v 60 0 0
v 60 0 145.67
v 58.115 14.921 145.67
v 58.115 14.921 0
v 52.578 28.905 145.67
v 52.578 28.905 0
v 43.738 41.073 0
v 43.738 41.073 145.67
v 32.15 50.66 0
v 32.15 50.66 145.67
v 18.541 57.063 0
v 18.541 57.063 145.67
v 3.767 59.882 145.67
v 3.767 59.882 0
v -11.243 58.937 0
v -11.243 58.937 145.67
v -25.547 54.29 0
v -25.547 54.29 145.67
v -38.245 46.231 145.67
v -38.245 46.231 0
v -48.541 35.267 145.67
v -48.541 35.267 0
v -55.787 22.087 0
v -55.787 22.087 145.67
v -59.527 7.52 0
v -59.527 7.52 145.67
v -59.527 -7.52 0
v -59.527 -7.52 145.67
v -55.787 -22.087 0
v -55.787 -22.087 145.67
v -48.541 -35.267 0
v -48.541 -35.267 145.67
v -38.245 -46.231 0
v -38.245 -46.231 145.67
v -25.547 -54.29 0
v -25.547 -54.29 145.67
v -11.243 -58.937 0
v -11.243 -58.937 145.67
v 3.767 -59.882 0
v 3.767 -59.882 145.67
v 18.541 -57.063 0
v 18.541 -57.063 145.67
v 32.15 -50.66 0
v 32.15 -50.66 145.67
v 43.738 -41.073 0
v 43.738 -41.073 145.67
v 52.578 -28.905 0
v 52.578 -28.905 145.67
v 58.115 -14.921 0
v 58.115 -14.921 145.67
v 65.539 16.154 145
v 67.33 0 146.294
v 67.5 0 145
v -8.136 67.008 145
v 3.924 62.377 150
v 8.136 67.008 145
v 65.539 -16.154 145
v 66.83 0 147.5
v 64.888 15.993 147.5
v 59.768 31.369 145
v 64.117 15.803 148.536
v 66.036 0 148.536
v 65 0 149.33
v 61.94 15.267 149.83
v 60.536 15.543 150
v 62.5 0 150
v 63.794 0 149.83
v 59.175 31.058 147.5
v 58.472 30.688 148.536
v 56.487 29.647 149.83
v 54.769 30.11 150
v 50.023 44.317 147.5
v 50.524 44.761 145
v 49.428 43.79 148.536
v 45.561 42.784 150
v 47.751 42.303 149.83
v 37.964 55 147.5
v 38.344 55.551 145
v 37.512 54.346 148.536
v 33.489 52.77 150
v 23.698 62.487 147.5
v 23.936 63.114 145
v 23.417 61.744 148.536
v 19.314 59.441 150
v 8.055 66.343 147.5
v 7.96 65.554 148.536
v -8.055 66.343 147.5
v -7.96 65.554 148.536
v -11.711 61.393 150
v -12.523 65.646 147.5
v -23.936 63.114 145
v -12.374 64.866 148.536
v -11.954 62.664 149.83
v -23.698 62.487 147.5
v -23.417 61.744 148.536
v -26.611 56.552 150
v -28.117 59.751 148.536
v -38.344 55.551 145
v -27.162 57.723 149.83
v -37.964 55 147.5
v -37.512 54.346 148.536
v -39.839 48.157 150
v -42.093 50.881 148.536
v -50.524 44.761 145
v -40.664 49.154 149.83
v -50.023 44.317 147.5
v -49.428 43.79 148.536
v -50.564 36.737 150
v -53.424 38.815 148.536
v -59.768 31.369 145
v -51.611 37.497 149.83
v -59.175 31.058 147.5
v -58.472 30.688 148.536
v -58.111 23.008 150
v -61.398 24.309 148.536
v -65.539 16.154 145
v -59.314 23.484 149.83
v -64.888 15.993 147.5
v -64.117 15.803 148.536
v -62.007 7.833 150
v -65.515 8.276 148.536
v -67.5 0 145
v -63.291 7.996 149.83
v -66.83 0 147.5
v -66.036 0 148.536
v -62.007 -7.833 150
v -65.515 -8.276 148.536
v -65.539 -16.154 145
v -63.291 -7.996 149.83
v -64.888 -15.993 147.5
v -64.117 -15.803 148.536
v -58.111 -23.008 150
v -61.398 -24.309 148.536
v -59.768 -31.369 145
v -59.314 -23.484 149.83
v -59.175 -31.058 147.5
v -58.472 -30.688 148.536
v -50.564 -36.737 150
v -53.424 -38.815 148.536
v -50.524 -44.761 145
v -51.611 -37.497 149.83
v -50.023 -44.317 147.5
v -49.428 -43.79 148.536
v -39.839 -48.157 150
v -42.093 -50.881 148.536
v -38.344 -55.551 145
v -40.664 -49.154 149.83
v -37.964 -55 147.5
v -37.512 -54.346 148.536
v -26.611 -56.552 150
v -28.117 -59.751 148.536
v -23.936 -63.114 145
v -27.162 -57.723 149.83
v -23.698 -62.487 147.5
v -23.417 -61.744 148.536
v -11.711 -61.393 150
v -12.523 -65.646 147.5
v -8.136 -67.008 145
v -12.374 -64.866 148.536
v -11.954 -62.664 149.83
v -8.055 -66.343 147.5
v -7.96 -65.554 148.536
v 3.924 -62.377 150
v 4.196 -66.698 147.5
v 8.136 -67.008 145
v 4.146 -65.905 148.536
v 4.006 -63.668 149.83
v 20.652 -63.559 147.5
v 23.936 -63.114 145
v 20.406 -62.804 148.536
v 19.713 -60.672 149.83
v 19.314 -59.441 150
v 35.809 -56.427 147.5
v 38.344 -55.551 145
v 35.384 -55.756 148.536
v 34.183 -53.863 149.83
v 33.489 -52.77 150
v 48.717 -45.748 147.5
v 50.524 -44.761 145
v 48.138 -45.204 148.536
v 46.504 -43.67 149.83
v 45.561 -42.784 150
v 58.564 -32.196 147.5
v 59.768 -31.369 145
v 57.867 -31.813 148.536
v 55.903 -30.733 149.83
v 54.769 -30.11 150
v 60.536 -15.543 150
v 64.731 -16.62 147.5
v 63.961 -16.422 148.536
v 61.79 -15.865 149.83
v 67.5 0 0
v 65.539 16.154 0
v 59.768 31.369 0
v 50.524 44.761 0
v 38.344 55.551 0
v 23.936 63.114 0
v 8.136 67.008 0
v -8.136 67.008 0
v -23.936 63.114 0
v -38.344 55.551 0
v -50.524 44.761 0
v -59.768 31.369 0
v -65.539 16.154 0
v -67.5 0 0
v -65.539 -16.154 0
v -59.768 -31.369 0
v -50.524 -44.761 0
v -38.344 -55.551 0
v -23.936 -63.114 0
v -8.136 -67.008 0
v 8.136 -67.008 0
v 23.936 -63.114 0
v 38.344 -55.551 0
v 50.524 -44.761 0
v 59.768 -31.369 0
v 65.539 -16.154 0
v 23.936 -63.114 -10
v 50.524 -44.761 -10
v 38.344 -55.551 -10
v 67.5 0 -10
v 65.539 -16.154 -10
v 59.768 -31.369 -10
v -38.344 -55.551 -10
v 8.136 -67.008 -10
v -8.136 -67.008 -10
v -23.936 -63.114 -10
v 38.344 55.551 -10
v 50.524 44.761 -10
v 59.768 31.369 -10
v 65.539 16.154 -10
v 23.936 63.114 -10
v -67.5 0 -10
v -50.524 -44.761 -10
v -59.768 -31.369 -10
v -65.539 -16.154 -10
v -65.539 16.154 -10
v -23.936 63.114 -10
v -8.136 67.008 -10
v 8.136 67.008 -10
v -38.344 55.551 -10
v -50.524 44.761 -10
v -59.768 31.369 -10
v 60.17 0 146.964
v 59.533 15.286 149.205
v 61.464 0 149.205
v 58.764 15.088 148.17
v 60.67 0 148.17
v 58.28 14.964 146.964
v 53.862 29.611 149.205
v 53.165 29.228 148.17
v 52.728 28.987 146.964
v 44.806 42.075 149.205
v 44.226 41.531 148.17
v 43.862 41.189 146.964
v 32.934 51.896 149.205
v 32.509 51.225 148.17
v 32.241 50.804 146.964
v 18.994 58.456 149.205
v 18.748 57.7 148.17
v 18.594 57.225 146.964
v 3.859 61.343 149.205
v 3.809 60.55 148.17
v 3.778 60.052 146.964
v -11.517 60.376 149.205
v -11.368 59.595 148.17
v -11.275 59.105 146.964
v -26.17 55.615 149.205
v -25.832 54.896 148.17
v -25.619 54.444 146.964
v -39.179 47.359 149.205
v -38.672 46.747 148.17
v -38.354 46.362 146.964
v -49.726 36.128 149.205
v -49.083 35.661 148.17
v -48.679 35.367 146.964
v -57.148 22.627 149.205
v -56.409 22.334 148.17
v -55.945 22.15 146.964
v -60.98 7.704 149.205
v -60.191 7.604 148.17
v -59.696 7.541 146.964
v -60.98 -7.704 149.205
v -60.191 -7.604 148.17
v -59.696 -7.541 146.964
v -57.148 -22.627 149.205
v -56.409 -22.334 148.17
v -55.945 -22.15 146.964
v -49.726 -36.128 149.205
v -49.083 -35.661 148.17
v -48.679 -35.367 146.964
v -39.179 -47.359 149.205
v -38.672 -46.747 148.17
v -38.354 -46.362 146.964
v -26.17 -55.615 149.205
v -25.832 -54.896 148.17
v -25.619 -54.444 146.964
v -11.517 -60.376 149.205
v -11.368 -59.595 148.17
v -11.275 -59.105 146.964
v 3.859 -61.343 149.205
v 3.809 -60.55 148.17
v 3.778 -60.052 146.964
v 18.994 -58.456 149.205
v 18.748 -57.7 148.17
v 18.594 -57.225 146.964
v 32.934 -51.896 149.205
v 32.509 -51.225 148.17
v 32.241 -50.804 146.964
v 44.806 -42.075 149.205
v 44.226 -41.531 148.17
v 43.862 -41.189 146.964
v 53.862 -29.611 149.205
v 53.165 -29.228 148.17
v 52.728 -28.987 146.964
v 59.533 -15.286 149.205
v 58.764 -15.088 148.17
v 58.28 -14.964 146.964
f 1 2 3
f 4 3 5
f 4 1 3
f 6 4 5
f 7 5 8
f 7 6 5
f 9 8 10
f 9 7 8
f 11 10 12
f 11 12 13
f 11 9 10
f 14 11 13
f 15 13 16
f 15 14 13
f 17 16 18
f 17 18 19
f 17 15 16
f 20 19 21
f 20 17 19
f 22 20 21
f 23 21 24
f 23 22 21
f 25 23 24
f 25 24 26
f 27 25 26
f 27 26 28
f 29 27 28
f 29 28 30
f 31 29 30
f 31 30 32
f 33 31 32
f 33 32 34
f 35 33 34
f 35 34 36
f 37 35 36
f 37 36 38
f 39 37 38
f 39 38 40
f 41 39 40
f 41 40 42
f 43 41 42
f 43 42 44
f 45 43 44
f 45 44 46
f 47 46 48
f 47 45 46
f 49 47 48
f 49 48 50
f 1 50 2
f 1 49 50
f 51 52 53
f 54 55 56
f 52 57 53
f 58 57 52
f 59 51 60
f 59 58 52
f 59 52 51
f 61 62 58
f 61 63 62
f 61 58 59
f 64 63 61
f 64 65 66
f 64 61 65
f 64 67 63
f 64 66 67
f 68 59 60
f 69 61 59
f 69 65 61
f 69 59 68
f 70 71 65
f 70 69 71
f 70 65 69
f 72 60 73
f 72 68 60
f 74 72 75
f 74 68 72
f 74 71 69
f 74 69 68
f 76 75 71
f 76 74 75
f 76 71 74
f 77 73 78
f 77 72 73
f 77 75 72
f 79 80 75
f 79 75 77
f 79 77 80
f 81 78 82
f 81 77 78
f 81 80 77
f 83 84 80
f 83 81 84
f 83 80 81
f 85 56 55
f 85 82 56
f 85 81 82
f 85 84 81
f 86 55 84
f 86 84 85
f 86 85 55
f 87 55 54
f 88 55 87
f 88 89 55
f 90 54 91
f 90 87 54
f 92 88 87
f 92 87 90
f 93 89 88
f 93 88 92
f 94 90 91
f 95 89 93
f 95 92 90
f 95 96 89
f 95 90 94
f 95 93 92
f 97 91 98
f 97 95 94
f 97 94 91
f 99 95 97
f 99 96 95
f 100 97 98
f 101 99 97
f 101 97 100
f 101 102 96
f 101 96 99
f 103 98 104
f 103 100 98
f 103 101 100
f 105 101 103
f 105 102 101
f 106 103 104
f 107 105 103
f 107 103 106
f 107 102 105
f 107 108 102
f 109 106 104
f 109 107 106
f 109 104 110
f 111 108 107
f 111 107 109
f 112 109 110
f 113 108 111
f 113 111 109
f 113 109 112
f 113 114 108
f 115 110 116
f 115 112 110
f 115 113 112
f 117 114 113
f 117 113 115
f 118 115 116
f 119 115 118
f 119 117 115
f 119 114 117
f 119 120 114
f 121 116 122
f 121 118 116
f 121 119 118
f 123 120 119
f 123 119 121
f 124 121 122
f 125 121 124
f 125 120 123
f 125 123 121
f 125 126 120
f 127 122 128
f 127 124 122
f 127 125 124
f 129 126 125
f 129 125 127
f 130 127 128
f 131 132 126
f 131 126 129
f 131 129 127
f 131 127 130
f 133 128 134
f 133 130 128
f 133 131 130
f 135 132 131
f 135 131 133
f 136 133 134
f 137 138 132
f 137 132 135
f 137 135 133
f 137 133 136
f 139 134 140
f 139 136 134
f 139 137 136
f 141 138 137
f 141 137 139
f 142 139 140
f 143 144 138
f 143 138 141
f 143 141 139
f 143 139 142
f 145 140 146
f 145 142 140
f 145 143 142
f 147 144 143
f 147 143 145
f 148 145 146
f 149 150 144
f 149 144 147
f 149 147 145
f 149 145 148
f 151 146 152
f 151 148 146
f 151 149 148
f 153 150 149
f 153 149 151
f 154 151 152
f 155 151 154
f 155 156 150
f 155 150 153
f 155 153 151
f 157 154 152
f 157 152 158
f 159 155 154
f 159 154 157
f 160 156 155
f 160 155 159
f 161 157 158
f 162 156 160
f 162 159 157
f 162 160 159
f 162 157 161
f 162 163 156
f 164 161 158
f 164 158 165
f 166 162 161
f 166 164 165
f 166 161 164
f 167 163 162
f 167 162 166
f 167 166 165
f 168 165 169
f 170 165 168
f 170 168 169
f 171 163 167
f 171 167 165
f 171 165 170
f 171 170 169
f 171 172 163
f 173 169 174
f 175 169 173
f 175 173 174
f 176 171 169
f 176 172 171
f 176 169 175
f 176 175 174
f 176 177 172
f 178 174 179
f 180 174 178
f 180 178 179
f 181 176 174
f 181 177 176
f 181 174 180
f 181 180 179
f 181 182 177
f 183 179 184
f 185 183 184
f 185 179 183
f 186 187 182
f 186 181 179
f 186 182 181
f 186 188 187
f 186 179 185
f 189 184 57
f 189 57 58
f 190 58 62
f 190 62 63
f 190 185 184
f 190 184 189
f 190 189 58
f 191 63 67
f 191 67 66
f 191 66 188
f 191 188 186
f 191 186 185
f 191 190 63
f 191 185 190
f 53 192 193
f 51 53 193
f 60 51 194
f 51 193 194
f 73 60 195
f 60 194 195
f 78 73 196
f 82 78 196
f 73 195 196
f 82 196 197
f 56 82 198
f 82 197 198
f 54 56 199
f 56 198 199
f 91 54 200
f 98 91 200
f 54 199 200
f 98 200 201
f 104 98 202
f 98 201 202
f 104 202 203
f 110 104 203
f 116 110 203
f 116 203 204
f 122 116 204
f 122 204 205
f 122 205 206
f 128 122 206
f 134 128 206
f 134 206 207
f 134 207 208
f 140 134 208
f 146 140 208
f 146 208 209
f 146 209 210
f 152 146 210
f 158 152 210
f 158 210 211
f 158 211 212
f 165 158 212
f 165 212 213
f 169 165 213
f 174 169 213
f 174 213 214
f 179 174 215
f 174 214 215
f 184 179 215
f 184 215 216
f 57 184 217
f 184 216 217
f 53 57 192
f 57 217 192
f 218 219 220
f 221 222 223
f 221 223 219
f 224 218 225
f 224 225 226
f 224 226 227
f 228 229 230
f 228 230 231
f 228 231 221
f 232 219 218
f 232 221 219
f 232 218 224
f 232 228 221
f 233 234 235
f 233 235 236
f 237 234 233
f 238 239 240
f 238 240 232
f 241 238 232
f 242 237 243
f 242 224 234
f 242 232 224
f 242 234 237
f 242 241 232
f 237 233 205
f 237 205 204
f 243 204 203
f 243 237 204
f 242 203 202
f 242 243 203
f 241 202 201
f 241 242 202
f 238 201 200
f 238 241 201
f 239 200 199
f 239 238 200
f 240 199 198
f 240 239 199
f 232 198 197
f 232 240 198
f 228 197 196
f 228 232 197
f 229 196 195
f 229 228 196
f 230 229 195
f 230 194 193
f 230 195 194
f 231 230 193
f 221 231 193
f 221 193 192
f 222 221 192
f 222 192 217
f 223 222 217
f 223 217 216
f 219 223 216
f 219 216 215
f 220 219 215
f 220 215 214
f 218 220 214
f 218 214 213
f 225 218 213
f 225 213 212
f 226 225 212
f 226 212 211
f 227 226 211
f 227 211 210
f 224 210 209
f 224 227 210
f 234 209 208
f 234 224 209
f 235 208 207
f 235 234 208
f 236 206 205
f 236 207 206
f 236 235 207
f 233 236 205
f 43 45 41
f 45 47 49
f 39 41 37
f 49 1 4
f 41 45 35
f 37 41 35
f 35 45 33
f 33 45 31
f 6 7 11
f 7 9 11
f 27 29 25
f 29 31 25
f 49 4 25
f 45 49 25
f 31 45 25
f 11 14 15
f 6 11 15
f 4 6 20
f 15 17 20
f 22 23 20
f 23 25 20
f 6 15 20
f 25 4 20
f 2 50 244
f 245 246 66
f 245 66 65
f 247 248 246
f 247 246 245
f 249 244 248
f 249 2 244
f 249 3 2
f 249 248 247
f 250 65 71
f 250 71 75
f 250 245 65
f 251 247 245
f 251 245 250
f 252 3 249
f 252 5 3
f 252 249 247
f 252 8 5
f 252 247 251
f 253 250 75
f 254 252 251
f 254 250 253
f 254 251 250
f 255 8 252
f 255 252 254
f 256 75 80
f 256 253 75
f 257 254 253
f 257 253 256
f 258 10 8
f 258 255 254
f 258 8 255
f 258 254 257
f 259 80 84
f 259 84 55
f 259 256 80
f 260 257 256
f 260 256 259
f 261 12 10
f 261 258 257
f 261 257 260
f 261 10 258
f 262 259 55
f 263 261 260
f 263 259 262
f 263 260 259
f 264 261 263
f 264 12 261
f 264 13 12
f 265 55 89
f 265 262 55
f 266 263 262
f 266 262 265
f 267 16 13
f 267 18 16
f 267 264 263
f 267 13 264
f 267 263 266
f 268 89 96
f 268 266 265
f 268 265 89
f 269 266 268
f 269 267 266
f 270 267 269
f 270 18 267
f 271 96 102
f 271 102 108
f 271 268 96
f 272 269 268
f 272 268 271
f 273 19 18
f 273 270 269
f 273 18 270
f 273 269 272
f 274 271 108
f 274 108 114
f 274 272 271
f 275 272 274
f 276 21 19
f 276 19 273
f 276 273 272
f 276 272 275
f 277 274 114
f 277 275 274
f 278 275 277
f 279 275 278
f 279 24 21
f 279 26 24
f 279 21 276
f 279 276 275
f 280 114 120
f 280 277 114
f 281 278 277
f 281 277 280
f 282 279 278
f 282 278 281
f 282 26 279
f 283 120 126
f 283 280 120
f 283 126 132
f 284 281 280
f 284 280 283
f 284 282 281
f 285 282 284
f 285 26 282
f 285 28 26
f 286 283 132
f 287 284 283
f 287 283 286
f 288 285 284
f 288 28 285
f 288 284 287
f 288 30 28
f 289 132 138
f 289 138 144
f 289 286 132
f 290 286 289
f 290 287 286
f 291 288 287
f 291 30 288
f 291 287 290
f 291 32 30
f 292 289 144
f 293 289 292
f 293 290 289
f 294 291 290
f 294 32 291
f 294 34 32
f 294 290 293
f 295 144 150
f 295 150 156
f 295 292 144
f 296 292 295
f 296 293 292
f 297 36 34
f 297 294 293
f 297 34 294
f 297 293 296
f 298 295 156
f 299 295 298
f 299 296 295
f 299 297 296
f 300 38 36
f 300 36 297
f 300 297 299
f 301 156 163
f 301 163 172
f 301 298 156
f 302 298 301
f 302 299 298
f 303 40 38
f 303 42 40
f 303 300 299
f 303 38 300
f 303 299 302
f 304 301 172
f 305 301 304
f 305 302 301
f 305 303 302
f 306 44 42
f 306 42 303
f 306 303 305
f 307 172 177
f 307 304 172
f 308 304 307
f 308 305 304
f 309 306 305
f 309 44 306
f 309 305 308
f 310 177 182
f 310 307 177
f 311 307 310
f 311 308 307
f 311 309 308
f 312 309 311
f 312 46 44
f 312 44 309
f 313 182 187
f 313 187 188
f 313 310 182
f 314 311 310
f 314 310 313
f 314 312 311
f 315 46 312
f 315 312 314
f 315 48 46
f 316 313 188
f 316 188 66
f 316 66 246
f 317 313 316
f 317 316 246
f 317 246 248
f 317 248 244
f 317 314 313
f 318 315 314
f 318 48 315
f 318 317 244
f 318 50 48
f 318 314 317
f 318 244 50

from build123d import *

# Parameters (mm, degrees)
IZIM1_R                     = 67.5
IZIM1_R_2                   = 60
Y_KSEKLIK_EKSTR_ZYON1_DEPTH = 150
Y_KSEKLIK_EKSTR_ZYON2_START = 10
IZIM2_R                     = 67.5
Y_KSEKLIK_EKSTR_ZYON2_DEPTH = 10
RADYUS1_R                   = 5
RADYUS2_R                   = 5


with BuildPart() as part:
    # Çizim1 → Yükseklik-Ekstrüzyon1 (new body)
    with BuildSketch(Plane.XY):
        Circle(IZIM1_R)
        Circle(IZIM1_R_2, mode=Mode.SUBTRACT)
    extrude(amount=Y_KSEKLIK_EKSTR_ZYON1_DEPTH)

    # Çizim2 → Yükseklik-Ekstrüzyon2 (add)
    with BuildSketch(Plane(origin=(0, 0, 0), x_dir=(-1, 0, 0), z_dir=(0, 0, -1)).offset(Y_KSEKLIK_EKSTR_ZYON2_START)):
        Circle(IZIM2_R)
    extrude(amount=-Y_KSEKLIK_EKSTR_ZYON2_DEPTH)

    # Radyus1
    radyus1_edges = [part.edges().sort_by_distance(p)[0] for p in [
        (-67.5, 0, 150),
    ]]
    fillet(radyus1_edges, radius=RADYUS1_R)

    # Radyus2
    # the kernel refuses this fillet: 5 mm, written as the material it takes off along each edge
    with BuildSketch(Plane(origin=(0, 0, 150), x_dir=(1, 0, 0), z_dir=(0, -1, 0))) as radyus2_piece_1:
        with BuildLine():
            CenterArc((65, -4.330127019), RADYUS2_R, 120, 60)
            Line((60, -4.330127019), (59.9, -4.330127019))
            Line((59.9, -4.330127019), (59.9, 0))
            Line((59.9, 0), (60, 0.1))
            ThreePointArc((60, 0.1), (61.25, 0.1), (62.45, 0.08660254))
            Line((62.45, 0.08660254), (62.5, 0))
        make_face()
    revolve(axis=Axis((0, 0, 150), (0, 0, 1)), mode=Mode.SUBTRACT)


solid = part.part
